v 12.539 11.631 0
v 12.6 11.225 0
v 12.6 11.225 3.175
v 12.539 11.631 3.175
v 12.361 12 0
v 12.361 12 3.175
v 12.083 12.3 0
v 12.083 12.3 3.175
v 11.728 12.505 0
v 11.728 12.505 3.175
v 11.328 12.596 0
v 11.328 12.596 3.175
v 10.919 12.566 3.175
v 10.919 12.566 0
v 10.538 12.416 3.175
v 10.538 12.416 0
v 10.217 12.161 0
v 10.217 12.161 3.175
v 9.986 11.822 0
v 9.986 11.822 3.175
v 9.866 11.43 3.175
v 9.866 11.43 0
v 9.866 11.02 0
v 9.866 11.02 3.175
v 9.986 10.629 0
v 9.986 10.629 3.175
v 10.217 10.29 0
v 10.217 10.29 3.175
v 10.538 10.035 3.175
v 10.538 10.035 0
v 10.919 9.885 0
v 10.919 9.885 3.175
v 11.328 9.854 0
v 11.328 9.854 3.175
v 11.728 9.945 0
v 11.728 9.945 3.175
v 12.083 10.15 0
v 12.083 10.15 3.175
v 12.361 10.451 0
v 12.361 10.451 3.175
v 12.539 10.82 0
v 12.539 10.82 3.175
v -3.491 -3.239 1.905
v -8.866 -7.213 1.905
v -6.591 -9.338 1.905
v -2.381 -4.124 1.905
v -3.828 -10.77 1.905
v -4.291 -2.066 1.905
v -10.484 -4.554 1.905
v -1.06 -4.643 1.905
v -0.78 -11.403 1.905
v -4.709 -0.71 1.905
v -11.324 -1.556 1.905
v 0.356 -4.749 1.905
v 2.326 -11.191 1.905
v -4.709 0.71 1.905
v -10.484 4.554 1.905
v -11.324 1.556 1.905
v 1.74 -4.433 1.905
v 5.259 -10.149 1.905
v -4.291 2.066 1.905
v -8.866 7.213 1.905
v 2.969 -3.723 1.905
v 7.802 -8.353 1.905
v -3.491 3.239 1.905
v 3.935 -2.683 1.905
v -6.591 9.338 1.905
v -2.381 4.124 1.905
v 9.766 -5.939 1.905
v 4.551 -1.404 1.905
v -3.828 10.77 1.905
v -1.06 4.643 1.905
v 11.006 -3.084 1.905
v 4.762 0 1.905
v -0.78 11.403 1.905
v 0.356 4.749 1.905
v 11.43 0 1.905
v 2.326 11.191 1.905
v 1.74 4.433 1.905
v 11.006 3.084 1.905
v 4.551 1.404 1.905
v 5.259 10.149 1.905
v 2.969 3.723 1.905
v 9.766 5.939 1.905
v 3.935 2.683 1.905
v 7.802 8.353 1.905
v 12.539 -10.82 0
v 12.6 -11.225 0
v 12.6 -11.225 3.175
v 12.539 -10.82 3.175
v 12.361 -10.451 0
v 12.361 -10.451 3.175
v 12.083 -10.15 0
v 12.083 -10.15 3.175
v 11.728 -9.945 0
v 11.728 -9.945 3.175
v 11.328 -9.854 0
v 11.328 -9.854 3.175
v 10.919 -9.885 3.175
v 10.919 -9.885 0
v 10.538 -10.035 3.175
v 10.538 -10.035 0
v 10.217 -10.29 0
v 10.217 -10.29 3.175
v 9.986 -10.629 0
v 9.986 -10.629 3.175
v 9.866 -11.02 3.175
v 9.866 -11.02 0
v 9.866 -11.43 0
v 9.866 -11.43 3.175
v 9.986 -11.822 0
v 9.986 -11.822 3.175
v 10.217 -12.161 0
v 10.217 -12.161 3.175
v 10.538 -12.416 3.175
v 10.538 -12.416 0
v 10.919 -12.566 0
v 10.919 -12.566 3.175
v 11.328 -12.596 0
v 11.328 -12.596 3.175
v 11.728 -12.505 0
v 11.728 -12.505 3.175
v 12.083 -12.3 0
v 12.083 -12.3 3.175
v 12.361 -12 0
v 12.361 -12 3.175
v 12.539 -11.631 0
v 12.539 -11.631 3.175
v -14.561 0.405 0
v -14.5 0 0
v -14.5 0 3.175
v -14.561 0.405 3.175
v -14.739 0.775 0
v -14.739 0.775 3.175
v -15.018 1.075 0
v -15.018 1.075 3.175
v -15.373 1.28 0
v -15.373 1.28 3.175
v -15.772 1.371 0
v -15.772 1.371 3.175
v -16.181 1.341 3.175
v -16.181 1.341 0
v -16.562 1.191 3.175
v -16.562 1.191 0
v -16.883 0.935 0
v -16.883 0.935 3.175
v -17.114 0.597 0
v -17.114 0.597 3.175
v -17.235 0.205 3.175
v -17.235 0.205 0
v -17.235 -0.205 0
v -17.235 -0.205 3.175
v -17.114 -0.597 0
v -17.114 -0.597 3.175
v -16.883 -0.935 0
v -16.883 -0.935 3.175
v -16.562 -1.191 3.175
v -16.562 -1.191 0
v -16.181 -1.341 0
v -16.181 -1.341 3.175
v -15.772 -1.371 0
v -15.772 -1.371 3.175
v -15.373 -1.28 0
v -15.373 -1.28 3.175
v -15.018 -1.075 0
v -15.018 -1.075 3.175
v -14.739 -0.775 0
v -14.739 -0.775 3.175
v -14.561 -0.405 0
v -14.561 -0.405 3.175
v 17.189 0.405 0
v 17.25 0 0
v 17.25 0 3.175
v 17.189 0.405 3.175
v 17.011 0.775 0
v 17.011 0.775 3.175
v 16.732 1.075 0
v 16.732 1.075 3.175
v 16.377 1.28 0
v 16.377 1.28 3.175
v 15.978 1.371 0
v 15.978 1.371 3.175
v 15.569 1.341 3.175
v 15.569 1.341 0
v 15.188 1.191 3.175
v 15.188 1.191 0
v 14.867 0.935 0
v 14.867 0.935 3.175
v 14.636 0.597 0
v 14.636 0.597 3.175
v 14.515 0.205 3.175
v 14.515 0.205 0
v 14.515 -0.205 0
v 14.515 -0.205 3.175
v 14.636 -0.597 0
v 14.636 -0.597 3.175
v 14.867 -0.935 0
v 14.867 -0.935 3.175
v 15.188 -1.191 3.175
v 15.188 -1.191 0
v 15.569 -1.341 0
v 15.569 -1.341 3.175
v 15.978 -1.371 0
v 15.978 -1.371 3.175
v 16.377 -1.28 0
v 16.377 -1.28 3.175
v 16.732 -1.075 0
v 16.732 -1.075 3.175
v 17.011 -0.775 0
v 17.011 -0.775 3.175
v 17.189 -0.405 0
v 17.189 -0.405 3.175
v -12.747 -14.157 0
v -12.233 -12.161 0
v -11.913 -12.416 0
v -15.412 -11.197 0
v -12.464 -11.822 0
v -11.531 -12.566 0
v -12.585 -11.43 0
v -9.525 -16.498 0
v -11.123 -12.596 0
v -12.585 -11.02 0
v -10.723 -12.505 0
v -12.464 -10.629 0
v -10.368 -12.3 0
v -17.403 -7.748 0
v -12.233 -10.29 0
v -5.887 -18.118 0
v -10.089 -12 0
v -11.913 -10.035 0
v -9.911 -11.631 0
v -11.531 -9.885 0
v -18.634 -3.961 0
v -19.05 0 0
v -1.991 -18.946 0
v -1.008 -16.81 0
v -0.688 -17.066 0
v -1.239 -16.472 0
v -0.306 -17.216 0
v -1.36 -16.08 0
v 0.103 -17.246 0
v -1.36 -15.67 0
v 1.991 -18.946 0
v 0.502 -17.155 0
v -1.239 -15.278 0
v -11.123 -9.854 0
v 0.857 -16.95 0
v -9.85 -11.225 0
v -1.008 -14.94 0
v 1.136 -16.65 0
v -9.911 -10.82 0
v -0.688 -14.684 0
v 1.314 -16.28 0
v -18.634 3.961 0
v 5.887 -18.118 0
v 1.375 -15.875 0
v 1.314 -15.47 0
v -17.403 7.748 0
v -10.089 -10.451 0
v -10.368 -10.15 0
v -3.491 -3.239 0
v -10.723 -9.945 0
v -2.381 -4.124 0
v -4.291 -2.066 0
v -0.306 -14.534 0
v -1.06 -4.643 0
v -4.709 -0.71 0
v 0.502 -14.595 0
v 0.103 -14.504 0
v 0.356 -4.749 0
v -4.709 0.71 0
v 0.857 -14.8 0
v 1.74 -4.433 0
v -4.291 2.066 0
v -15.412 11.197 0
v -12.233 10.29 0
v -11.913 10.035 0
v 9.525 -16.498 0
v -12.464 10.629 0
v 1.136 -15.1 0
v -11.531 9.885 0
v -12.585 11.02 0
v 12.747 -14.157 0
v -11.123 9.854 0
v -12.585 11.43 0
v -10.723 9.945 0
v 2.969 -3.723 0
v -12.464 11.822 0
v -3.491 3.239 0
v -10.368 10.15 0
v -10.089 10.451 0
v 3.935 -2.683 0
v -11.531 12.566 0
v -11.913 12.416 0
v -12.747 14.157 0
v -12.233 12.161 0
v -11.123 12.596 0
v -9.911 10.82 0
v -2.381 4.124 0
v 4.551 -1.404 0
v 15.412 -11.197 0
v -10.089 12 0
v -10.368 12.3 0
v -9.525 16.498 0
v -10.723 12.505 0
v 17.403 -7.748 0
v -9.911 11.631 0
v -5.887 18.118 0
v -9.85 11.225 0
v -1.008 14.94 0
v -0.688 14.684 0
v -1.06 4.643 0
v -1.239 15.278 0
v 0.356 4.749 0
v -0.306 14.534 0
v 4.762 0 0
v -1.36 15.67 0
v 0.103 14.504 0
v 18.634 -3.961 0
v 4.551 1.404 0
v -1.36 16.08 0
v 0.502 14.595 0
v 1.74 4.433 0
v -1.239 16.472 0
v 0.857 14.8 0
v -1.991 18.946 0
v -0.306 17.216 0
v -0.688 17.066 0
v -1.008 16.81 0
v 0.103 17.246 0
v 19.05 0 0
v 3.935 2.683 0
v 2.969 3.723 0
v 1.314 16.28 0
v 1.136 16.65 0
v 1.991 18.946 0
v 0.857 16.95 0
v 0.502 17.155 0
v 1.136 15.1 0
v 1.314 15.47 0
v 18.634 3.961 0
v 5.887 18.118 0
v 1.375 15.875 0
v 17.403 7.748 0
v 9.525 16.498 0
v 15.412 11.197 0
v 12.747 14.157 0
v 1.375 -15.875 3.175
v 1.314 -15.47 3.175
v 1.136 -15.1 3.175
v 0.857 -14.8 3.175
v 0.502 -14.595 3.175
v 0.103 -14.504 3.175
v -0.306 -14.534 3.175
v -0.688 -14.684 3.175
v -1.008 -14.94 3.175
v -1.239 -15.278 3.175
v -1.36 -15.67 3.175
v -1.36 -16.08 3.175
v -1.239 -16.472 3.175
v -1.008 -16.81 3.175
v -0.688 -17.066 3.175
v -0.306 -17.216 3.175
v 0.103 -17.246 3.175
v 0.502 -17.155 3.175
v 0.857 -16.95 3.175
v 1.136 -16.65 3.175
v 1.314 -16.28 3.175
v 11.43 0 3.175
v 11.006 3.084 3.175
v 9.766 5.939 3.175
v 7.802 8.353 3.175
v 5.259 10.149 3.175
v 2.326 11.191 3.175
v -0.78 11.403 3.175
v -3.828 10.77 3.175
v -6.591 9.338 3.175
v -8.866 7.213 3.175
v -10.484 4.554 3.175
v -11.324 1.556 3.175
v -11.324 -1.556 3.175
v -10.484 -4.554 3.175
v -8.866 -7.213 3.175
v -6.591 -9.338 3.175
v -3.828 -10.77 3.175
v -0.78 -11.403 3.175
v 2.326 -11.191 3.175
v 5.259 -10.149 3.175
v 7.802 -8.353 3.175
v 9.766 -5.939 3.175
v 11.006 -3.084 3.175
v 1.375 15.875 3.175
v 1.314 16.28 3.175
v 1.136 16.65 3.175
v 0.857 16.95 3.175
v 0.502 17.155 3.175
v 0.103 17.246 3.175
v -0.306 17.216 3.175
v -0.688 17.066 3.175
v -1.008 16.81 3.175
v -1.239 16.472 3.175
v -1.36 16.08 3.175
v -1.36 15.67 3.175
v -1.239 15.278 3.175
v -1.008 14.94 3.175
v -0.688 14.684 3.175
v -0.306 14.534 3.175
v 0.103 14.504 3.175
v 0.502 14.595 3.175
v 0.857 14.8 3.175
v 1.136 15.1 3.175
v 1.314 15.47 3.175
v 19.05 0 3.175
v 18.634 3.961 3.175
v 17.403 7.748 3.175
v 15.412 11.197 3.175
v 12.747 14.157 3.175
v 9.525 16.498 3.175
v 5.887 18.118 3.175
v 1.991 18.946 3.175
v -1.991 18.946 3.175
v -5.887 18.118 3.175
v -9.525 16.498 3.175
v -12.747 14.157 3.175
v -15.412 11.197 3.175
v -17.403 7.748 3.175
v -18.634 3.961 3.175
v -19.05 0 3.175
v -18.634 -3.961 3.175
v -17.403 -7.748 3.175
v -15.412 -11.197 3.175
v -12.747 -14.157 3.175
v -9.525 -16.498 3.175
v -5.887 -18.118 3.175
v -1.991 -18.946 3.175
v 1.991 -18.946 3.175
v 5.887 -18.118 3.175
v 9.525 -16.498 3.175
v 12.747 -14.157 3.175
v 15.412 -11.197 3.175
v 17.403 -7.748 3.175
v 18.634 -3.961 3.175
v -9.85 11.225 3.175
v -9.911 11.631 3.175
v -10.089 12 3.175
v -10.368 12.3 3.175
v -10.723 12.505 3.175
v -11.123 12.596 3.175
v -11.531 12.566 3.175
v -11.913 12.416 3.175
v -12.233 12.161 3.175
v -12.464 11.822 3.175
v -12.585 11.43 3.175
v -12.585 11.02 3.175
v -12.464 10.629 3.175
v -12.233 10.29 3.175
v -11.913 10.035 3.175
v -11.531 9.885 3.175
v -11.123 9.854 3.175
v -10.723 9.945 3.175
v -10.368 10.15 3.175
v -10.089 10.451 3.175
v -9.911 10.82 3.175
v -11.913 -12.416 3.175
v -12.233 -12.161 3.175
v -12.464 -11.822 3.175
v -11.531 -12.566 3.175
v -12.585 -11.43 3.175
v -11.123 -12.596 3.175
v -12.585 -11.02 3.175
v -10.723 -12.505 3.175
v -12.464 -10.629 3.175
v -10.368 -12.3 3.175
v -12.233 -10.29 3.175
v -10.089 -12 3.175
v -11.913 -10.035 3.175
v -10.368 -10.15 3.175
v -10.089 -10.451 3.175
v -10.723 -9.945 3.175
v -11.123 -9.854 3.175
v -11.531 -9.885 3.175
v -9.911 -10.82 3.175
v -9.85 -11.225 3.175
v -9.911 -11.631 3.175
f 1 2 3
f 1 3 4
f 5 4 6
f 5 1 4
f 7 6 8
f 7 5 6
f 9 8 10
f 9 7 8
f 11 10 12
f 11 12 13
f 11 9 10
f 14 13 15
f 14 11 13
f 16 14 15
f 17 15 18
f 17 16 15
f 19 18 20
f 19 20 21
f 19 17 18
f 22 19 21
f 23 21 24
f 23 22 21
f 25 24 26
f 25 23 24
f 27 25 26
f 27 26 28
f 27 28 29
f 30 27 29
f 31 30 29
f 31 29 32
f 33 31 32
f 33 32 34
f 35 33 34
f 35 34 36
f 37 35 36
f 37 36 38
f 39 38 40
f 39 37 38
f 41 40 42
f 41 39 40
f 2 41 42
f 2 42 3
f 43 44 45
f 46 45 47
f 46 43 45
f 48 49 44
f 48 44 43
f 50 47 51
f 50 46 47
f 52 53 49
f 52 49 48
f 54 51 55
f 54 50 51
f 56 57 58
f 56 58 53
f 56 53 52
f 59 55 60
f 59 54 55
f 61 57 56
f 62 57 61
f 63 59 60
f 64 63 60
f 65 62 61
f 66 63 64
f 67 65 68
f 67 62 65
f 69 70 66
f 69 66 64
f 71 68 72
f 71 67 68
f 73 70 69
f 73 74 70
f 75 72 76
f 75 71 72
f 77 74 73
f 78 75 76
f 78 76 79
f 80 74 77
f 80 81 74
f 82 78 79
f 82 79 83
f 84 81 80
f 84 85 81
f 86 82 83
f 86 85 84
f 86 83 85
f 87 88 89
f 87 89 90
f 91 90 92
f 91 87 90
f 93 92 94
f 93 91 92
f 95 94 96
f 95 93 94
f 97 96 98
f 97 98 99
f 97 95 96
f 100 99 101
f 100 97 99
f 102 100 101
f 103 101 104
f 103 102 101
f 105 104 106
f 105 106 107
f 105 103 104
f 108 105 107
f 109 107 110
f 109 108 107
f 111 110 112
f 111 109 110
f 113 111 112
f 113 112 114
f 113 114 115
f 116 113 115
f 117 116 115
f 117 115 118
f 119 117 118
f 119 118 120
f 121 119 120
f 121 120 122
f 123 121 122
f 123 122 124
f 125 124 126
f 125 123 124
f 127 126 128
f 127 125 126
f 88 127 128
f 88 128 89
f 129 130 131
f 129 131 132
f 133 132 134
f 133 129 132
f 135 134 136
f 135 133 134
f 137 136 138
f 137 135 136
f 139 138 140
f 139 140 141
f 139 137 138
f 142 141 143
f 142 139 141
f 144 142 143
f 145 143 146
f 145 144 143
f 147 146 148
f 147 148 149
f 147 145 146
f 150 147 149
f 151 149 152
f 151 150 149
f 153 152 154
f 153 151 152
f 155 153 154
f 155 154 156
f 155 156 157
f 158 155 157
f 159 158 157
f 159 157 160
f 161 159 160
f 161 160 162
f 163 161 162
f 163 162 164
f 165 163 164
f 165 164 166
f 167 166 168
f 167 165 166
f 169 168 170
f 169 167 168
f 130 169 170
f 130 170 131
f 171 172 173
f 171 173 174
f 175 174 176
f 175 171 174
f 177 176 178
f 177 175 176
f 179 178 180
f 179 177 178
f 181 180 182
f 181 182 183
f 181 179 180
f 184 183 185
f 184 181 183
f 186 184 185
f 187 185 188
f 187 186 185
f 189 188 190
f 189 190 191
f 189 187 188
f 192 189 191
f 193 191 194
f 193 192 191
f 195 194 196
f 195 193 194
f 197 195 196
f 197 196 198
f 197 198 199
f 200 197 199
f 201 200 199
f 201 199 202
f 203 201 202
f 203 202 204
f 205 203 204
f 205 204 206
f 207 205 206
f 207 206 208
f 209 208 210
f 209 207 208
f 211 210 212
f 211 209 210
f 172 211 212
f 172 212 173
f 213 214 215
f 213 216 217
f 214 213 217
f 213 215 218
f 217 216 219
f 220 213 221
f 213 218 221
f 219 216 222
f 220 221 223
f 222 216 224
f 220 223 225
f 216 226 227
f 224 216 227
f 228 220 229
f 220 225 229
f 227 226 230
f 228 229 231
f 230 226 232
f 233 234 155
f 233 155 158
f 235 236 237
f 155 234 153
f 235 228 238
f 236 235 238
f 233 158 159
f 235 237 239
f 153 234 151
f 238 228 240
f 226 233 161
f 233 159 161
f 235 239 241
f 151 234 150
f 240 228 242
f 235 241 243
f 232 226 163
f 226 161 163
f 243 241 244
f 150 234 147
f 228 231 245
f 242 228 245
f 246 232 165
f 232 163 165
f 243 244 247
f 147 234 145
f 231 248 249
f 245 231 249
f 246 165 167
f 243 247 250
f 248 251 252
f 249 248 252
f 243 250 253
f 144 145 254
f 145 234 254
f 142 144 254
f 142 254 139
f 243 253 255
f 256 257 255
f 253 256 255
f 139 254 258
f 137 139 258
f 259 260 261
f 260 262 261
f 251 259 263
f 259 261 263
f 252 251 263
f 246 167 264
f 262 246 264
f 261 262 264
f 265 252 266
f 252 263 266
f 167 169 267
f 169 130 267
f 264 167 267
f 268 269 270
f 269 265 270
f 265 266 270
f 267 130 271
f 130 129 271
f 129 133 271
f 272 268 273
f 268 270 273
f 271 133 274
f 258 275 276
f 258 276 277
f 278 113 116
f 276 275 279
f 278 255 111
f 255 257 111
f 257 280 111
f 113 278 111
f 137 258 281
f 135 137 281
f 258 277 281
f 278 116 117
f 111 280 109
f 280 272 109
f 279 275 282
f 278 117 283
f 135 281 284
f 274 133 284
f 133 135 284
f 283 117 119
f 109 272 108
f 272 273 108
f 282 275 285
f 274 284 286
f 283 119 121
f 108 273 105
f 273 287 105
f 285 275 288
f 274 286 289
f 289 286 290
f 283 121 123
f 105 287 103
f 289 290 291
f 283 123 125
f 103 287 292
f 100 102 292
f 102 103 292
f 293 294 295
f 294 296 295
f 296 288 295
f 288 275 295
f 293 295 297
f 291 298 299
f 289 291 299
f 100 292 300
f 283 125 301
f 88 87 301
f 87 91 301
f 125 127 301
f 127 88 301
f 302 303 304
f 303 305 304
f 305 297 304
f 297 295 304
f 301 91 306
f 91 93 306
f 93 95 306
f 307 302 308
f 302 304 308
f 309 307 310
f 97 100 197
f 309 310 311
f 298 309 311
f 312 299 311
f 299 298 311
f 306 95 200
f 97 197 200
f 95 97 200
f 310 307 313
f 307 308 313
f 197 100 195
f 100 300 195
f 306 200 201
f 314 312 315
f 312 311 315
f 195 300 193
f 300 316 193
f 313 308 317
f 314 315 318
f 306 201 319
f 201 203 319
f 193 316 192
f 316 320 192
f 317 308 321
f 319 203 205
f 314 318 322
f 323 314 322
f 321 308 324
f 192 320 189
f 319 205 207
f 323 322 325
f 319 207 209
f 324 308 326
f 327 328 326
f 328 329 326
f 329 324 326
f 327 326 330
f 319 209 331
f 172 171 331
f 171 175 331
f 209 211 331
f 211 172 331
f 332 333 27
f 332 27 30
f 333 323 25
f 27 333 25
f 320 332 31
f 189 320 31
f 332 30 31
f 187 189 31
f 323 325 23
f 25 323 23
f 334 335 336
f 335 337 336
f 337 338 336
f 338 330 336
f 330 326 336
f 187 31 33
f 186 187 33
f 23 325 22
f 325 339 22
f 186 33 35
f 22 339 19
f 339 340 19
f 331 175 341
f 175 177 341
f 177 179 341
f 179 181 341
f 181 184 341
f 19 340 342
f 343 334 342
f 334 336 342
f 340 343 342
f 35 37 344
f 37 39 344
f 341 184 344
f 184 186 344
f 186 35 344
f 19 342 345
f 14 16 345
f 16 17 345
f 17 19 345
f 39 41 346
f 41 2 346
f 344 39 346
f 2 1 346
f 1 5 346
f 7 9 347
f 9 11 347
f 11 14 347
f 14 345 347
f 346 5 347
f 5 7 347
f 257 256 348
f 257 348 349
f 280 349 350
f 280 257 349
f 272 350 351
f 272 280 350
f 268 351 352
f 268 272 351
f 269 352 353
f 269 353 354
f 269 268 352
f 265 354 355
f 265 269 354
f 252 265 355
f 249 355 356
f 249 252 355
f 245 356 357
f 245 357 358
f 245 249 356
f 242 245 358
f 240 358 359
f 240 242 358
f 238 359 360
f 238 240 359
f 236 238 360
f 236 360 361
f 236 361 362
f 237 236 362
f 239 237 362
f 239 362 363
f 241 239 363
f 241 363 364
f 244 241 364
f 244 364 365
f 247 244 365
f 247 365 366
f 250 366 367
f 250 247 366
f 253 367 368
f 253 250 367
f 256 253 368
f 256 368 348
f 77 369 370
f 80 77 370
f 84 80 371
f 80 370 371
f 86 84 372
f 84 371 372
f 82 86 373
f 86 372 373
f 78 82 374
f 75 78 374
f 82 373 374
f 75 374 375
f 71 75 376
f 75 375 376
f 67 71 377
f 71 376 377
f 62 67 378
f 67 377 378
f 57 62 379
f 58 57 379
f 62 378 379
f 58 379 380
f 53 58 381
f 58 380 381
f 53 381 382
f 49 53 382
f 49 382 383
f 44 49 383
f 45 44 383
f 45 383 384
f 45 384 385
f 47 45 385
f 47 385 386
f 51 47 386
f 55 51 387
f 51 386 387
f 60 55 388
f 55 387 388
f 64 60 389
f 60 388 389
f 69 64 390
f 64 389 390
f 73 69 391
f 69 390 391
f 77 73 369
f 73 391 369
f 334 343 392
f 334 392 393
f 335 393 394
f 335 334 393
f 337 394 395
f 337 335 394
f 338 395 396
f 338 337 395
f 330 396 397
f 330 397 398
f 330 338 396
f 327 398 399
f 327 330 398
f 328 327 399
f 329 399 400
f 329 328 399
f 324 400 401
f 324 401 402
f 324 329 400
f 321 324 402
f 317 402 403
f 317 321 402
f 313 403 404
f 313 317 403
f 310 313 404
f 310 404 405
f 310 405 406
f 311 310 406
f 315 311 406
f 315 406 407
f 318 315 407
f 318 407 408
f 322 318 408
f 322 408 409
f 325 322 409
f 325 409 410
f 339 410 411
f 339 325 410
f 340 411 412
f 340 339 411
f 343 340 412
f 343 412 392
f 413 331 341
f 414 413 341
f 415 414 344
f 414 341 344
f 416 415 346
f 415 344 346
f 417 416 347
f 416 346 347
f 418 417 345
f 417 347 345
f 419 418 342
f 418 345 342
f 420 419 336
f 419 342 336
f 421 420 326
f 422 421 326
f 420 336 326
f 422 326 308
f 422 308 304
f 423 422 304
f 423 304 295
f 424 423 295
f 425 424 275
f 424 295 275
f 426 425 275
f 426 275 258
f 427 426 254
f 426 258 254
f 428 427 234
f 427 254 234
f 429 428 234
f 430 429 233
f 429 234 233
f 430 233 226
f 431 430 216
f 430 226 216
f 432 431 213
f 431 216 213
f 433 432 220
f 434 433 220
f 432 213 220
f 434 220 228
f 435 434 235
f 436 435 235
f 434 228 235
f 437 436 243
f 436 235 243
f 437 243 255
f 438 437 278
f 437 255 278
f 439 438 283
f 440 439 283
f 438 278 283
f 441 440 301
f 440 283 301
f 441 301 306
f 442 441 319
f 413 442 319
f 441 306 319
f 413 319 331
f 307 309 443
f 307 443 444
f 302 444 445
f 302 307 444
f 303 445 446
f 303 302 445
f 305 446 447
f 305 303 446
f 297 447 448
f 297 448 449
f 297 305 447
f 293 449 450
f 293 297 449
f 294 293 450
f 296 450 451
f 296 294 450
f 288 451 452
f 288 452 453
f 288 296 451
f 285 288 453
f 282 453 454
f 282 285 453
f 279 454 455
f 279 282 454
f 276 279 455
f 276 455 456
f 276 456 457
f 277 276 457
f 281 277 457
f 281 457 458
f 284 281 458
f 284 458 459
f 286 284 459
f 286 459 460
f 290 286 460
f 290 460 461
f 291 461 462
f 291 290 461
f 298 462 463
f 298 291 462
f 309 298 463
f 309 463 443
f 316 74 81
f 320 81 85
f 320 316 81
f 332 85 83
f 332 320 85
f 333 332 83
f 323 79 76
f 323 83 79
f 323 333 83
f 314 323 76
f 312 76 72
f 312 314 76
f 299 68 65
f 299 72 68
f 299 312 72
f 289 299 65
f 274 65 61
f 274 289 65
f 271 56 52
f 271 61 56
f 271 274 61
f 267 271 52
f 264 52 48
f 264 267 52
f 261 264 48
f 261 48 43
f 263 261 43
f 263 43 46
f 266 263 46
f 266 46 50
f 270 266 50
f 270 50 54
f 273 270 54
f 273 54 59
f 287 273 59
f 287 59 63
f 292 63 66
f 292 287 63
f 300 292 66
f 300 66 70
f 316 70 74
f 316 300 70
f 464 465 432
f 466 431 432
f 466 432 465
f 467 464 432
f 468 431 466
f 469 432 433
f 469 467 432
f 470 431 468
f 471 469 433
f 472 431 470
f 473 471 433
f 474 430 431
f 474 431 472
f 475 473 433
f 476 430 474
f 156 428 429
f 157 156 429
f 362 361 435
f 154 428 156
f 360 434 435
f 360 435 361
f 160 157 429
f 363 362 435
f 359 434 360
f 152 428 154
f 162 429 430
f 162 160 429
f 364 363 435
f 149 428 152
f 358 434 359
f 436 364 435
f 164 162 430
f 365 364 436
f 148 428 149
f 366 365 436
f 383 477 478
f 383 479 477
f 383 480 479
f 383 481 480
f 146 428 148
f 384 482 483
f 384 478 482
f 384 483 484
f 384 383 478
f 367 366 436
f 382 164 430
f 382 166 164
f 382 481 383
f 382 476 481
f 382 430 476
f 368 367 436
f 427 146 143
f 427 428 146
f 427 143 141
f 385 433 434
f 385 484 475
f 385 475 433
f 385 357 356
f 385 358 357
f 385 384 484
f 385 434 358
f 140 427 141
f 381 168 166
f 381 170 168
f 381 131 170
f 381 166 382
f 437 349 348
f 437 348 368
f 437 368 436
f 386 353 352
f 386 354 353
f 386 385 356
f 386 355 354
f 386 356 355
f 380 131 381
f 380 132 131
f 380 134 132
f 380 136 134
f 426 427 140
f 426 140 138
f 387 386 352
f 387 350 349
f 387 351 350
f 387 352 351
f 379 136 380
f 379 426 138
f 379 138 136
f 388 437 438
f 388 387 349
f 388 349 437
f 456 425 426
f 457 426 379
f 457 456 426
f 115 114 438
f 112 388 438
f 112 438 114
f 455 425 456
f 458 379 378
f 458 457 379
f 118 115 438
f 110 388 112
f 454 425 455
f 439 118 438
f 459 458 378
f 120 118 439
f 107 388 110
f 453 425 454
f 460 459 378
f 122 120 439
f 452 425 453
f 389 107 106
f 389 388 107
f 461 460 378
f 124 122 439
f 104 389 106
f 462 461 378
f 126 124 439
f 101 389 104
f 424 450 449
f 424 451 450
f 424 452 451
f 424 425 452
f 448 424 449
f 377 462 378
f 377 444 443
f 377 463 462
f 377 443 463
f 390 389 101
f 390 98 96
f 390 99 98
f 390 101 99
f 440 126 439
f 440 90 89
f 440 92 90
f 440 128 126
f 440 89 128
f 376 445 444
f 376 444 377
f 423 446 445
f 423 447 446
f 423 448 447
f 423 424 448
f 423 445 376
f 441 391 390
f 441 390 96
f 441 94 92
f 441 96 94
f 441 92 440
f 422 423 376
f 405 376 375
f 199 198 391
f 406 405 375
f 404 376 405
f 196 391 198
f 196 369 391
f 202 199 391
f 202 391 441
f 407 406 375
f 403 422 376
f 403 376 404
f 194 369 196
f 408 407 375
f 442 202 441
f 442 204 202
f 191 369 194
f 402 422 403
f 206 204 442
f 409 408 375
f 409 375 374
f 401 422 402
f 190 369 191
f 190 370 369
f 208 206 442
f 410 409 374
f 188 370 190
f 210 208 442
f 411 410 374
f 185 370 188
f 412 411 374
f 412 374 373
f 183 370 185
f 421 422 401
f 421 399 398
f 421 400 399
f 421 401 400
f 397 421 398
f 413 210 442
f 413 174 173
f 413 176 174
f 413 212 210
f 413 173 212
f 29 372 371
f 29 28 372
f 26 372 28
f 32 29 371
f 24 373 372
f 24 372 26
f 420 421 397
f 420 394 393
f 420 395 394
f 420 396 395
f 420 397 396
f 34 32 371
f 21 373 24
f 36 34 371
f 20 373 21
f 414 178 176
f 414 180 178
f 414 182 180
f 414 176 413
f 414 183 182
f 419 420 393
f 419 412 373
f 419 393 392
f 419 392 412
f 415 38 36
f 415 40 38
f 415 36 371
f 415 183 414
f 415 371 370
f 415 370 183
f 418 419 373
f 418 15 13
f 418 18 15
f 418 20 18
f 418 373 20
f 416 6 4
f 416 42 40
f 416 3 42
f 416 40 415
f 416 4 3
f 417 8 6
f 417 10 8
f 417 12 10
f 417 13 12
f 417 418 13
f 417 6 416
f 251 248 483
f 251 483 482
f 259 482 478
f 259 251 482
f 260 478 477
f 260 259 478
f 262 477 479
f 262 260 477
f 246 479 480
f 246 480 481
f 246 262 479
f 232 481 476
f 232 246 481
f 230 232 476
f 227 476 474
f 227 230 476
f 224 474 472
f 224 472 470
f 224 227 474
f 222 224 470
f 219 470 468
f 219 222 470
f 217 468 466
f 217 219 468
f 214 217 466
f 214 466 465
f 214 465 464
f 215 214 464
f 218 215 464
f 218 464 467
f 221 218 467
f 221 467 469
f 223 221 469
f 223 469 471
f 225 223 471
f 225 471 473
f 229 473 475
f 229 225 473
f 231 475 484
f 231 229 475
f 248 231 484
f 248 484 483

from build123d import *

# Parameters (mm, degrees)
SKETCH1_R           = 19.05
SKETCH1_R_2         = 1.375
SKETCH1_R_3         = 4.7625
BOSS_EXTRUDE1_DEPTH = 3.175
SKETCH2_R           = 11.43
CUT_EXTRUDE1_DEPTH  = 1.27


with BuildPart() as part:
    # Sketch1 → Boss-Extrude1 (new body)
    with BuildSketch(Plane.XY):
        Circle(SKETCH1_R)
        with Locations((0, 15.875)):
            Circle(SKETCH1_R_2, mode=Mode.SUBTRACT)
        with Locations((11.225320151, 11.225320151)):
            Circle(SKETCH1_R_2, mode=Mode.SUBTRACT)
        with Locations((15.875, 0)):
            Circle(SKETCH1_R_2, mode=Mode.SUBTRACT)
        Circle(SKETCH1_R_3, mode=Mode.SUBTRACT)
        with Locations((11.225320151, -11.225320151)):
            Circle(SKETCH1_R_2, mode=Mode.SUBTRACT)
        with Locations((0, -15.875)):
            Circle(SKETCH1_R_2, mode=Mode.SUBTRACT)
        with Locations((-11.225320151, -11.225320151)):
            Circle(SKETCH1_R_2, mode=Mode.SUBTRACT)
        with Locations((-15.875, 0)):
            Circle(SKETCH1_R_2, mode=Mode.SUBTRACT)
        with Locations((-11.225320151, 11.225320151)):
            Circle(SKETCH1_R_2, mode=Mode.SUBTRACT)
    extrude(amount=BOSS_EXTRUDE1_DEPTH)

    # Sketch2 → Cut-Extrude1 (cut)
    with BuildSketch(Plane.XY.offset(3.175)):
        Circle(SKETCH2_R)
    extrude(amount=-CUT_EXTRUDE1_DEPTH, mode=Mode.SUBTRACT)


solid = part.part
